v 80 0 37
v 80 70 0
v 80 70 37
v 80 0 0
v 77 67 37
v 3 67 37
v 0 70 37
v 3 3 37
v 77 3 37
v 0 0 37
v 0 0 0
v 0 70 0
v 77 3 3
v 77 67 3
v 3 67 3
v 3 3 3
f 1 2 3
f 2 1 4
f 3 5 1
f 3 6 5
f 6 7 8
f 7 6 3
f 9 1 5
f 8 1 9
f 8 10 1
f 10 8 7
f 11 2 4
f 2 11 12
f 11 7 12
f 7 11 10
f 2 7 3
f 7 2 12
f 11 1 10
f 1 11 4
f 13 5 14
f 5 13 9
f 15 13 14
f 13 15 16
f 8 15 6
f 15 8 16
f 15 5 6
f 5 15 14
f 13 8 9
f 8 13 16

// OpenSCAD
// Open-top storage bin / parts tray - a rectangular box open at the top, for small parts
// or bench organisation. NOVEL general part.
//
// @desc open-top storage bin / parts tray
// @prompt Design an open-top storage bin in OpenSCAD: {inner_l} by {inner_w} mm inside and {height} mm tall, with {wall} mm walls and a solid floor. Reply with a single complete OpenSCAD file.
// @param inner_l inner length, mm      [30:200]
// @param inner_w inner width, mm       [30:150]
// @param height  height, mm            [15:120]
// @param wall    wall thickness, mm    [1.6:4]

inner_l = 74;
inner_w = 64;
height  = 37;
wall    = 3;

difference() {
    cube([inner_l + 2 * wall, inner_w + 2 * wall, height]);
    translate([wall, wall, wall]) cube([inner_l, inner_w, height]);     // hollow, open top
}
